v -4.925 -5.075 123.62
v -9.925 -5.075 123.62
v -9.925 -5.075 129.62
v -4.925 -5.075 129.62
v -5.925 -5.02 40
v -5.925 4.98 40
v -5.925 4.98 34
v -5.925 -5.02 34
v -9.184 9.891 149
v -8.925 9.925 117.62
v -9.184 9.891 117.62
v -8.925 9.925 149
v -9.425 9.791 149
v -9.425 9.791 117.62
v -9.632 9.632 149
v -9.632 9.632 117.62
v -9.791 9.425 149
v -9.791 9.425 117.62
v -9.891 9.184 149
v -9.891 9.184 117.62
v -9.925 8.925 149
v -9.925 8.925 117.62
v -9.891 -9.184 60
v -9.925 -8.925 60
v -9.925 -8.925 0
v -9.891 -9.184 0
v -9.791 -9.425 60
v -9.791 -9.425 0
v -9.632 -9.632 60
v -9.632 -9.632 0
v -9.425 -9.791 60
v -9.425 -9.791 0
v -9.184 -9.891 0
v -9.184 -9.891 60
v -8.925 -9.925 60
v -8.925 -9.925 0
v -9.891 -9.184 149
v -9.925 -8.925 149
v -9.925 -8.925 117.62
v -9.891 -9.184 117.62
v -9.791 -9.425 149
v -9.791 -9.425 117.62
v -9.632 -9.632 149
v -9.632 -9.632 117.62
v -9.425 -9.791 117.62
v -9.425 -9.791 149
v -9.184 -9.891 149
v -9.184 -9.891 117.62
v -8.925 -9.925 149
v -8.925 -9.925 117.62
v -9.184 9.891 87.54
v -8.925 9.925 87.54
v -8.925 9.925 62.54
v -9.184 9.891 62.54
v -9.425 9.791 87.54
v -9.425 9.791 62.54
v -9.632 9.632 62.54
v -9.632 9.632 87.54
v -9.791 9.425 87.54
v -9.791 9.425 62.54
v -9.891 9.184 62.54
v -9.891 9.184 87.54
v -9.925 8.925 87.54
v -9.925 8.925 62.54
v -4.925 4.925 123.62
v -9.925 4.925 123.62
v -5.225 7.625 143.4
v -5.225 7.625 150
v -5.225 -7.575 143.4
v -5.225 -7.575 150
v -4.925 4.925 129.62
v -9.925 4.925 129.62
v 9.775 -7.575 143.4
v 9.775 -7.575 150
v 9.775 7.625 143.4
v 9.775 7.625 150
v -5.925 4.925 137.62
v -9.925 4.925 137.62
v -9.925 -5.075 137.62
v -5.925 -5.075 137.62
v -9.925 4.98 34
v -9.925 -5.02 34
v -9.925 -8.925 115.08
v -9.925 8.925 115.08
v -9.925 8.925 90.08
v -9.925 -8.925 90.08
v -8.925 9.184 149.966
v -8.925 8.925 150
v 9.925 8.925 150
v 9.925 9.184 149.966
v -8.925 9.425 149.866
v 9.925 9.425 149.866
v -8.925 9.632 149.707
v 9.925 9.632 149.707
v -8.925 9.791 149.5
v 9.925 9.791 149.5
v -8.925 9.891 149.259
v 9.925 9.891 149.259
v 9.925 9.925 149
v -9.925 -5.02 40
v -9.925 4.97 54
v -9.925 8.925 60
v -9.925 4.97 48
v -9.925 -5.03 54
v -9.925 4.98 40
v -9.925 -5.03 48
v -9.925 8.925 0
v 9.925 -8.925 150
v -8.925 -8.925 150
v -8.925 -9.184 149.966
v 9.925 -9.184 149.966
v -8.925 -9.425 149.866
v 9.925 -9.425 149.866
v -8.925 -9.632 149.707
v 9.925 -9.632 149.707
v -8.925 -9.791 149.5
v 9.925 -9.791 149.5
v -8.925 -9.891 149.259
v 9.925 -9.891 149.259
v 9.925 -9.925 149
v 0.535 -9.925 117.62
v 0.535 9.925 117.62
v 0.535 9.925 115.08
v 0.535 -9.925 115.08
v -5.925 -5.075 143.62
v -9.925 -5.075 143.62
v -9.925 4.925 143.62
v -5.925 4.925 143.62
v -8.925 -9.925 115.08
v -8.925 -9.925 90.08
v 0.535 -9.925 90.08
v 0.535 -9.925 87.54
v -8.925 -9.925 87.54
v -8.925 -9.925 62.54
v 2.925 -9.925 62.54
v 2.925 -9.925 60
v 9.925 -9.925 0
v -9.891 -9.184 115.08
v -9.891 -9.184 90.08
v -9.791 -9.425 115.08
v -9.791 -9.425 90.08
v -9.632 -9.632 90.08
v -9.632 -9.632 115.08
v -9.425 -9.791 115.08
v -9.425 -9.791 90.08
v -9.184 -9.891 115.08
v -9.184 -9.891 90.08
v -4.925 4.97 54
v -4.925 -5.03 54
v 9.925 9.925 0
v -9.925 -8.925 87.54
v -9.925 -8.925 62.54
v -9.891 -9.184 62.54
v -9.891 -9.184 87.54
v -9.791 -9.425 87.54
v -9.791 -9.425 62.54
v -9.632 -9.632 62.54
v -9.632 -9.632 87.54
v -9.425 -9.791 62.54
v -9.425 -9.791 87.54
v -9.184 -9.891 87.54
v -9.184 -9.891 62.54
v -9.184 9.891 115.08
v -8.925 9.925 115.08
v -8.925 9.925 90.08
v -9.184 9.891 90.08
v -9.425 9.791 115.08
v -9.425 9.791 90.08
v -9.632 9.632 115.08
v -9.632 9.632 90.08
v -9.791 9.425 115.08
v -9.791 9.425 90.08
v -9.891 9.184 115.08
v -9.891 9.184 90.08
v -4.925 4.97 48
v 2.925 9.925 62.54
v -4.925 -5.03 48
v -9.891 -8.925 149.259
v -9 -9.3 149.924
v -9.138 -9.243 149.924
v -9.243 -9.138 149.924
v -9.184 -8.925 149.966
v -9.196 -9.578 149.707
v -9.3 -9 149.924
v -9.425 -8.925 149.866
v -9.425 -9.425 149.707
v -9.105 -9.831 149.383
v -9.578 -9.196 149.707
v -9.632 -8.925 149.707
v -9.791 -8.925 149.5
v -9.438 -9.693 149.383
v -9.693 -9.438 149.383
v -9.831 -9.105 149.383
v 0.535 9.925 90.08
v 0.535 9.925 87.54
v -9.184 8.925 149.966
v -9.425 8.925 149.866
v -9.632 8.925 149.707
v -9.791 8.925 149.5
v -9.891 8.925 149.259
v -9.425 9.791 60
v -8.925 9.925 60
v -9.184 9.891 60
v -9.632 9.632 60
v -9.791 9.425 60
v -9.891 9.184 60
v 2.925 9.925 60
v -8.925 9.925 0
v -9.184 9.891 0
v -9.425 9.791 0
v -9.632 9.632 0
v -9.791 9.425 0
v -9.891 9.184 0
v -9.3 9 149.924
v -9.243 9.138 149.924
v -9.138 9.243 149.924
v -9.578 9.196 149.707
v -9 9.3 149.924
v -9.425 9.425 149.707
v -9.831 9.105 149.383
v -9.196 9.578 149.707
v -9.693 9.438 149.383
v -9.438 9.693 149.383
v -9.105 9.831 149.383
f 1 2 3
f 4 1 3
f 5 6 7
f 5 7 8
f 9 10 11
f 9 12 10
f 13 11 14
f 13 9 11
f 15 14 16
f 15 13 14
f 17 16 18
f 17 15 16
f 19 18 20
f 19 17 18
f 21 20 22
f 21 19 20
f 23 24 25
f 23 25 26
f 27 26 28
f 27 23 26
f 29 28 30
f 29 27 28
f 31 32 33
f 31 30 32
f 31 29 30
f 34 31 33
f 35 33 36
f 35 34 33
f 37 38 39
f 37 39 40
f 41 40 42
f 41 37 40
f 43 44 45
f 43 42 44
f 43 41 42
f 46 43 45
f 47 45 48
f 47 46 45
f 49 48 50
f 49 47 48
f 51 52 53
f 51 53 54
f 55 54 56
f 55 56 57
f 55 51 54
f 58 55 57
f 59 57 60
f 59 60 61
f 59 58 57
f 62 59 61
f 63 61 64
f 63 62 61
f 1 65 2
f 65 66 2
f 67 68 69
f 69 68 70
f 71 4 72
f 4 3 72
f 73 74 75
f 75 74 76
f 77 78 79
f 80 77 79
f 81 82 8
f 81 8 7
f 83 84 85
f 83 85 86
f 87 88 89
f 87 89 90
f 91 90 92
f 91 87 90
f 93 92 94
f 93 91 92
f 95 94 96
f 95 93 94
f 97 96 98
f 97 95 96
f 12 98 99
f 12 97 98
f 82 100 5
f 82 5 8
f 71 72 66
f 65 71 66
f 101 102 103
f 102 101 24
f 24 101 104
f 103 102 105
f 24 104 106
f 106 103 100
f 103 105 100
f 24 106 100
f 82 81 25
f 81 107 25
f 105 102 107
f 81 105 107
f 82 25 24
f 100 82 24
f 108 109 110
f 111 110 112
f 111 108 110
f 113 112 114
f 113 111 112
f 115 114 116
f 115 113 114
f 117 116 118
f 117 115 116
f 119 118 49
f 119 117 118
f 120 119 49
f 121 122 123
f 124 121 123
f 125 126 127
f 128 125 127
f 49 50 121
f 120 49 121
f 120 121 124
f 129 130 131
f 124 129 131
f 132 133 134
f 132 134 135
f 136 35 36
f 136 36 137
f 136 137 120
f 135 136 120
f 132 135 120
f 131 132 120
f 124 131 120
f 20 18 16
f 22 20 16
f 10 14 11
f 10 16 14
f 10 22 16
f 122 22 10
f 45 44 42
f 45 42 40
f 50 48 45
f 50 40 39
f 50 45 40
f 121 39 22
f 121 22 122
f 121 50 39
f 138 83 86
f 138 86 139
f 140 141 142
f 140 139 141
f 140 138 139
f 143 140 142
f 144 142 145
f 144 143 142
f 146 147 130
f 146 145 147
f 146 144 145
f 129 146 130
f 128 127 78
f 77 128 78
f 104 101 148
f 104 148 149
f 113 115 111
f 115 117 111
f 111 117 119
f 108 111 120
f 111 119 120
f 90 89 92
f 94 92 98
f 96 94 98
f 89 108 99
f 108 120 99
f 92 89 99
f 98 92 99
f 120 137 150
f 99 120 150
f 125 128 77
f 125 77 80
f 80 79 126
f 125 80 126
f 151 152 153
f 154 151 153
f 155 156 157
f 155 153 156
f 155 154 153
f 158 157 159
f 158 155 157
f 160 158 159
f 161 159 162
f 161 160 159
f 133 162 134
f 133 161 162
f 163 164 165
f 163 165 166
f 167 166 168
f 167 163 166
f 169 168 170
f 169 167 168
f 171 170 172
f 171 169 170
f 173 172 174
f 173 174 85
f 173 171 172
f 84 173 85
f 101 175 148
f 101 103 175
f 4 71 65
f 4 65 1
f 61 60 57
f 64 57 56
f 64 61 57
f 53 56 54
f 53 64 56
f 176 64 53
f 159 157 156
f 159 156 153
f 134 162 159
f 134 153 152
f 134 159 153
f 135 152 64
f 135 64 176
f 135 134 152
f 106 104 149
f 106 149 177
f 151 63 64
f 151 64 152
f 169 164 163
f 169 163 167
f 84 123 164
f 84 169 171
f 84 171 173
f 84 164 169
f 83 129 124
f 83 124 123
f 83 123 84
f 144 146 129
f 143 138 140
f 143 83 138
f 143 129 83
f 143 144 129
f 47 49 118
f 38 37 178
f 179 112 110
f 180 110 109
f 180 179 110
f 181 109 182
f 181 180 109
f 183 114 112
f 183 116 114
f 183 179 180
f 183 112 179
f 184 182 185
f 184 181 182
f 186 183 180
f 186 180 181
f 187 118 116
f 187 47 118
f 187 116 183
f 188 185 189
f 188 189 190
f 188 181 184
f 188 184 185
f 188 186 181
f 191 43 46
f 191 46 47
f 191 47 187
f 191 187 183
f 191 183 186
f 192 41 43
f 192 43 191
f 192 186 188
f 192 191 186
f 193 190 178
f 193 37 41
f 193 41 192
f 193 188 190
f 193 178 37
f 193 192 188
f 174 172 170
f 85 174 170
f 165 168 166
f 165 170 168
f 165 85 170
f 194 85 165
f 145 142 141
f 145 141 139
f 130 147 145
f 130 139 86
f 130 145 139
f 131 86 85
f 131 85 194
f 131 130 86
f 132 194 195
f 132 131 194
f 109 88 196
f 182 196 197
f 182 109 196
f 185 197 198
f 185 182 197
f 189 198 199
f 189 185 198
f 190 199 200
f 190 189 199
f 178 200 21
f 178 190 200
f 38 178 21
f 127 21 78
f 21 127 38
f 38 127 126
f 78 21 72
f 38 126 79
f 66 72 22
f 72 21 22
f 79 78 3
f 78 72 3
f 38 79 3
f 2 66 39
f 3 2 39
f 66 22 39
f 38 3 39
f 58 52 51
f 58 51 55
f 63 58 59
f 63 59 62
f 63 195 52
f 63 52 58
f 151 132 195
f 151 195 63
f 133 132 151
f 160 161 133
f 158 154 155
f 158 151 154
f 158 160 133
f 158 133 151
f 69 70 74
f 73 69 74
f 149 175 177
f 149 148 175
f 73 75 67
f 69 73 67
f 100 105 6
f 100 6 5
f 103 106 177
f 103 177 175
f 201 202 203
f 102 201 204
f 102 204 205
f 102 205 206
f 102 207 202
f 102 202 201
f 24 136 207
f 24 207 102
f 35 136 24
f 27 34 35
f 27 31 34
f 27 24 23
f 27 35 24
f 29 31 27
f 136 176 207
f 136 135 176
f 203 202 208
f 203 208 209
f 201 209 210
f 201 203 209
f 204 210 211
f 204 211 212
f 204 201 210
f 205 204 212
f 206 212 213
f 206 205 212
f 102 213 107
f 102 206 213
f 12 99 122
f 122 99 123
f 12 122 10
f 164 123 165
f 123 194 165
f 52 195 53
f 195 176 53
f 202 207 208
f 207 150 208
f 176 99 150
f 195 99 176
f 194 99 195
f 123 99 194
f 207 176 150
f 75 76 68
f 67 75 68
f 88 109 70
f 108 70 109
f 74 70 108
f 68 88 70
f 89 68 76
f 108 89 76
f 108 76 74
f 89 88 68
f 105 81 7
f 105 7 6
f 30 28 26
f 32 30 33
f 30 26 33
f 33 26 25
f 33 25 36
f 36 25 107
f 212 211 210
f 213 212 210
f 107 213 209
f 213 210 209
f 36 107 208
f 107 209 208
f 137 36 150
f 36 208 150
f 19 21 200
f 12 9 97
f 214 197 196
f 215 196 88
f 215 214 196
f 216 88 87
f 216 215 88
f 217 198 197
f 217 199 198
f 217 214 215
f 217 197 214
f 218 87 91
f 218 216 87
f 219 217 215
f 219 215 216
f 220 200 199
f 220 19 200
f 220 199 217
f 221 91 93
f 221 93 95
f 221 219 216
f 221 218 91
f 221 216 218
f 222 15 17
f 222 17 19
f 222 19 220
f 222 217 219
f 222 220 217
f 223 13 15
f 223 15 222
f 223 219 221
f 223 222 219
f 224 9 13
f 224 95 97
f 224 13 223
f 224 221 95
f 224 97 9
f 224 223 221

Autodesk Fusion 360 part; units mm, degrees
sketch "Sketch1" plane through (0, 0, 0) normal (0, 0, 1) x (1, 0, 0)
  line L0 (9.925, 9.925) -> (-9.925, 9.925)
  line L1 (-9.925, 9.925) -> (-9.925, -9.925)
  line L2 (-9.925, -9.925) -> (9.925, -9.925)
  line L3 (9.925, -9.925) -> (9.925, 9.925)
  line L4 (9.925, 9.925) -> (-9.925, -9.925) construction
  line L5 (-9.925, 9.925) -> (9.925, -9.925) construction
  dimension "d1" = 19.85
  dimension "d2" = 19.85
extrude "Extrude1" add sketch "Sketch1" along normal blind 150
sketch "Sketch2" plane through (0, -9.925, 0) normal (0, -1, 0) x (1, 0, 0)
  line L0 (-9.925, 0) -> (9.925, 0)
  line L1 (9.925, 0) -> (9.925, 150)
  line L2 (9.925, 150) -> (-9.925, 150)
  line L3 (-9.925, 150) -> (-9.925, 0)
  line L4 (-9.925, 62.54) -> (2.925, 62.54)
  line L5 (2.925, 62.54) -> (2.925, 60)
  line L6 (2.925, 60) -> (-9.925, 60)
  line L7 (-9.925, 60) -> (-9.925, 62.54)
  line L8 (-9.925, 90.08) -> (0.535, 90.08)
  line L9 (0.535, 90.08) -> (0.535, 87.54)
  line L10 (0.535, 87.54) -> (-9.925, 87.54)
  line L11 (-9.925, 87.54) -> (-9.925, 90.08)
  line L12 (-9.925, 117.62) -> (0.535, 117.62)
  line L13 (0.535, 117.62) -> (0.535, 115.08)
  line L14 (0.535, 115.08) -> (-9.925, 115.08)
  line L15 (-9.925, 115.08) -> (-9.925, 117.62)
  dimension "d5" = 12.85
  dimension "d6" = 2.54
  dimension "d7" = 60
  dimension "d8" = 10.46
  dimension "d9" = 2.54
  dimension "d10" = 25
  dimension "d11" = 10.46
  dimension "d12" = 2.54
  dimension "d13" = 25
extrude "Extrude2" cut sketch "Sketch2" against normal blind 30 contours L3 L4 L5 L6 L7 | L3 L8 L9 L10 L11 | L3 L12 L13 L14 L15
fillet "Fillet1" radius 1 8 edges at (-9.925, -9.925, 133.81) (-9.925, -9.925, 102.58) (-9.925, -9.925, 75.04) (-9.925, -9.925, 30) (-9.925, 9.925, 133.81) (-9.925, 9.925, 102.58) (-9.925, 9.925, 75.04) (-9.925, 9.925, 30)
fillet "Fillet2" radius 1 5 edges at (0.5, 9.925, 150) (-9.6321, 9.6321, 150) (-9.925, 0, 150) (-9.6321, -9.6321, 150) (0.5, -9.925, 150)
sketch "Sketch3" plane through (-9.925, 0, 0) normal (-1, 0, 0) x (0, -1, 0)
  line L0 (8.925, 149) -> (-8.925, 149)
  line L1 (-8.925, 149) -> (-8.925, 117.62)
  line L2 (-8.925, 117.62) -> (8.925, 117.62)
  line L3 (8.925, 117.62) -> (8.925, 149)
  line L4 (5.075, 129.62) -> (-4.925, 129.62)
  line L5 (-4.925, 129.62) -> (-4.925, 123.62)
  line L6 (-4.925, 123.62) -> (5.075, 123.62)
  line L7 (5.075, 123.62) -> (5.075, 129.62)
  line L8 (5.075, 129.62) -> (-4.925, 123.62) construction
  line L9 (-4.925, 129.62) -> (5.075, 123.62) construction
  line L10 (-4.9698, 54) -> (5.0302, 54)
  line L11 (5.0302, 54) -> (5.0302, 48)
  line L12 (5.0302, 48) -> (-4.9698, 48)
  line L13 (-4.9698, 48) -> (-4.9698, 54)
  line L14 (-4.9698, 54) -> (5.0302, 48) construction
  line L15 (5.0302, 54) -> (-4.9698, 48) construction
  line L16 (8.925, 60) -> (-8.925, 60)
  point P0 (0.075, 126.62)
  point P1 (0.0302, 51)
  dimension "d20" = 10
  dimension "d21" = 6
  dimension "d22" = 3.85
  dimension "d23" = 6
  dimension "d24" = 6
  dimension "d25" = 10
  dimension "d26" = 6
extrude "Extrude3" cut sketch "Sketch3" against normal blind 5 contours L4 L5 L6 L7 | L10 L11 L12 L13
sketch "Sketch4" plane through (0, 0, 150) normal (0, 0, 1) x (-1, 0, 0)
  line L0 (8.925, 8.925) -> (-9.925, 8.925)
  line L1 (-9.925, 8.925) -> (-9.925, -8.925)
  line L2 (-9.925, -8.925) -> (8.925, -8.925)
  line L3 (8.925, -8.925) -> (8.925, 8.925)
  line L4 (-9.775, -7.625) -> (5.225, -7.625)
  line L5 (5.225, -7.625) -> (5.225, 7.575)
  line L6 (5.225, 7.575) -> (-9.775, 7.575)
  line L7 (-9.775, 7.575) -> (-9.775, -7.625)
  line L8 (-9.775, -7.625) -> (5.225, 7.575) construction
  line L9 (5.225, -7.625) -> (-9.775, 7.575) construction
  point P0 (-2.275, -0.025)
  dimension "d29" = 15
  dimension "d30" = 15.2
  dimension "d31" = 1.3
  dimension "d32" = 3.7
extrude "Extrude4" cut sketch "Sketch4" against normal blind 6.6 contours L4 L5 L6 L7
sketch "Sketch7" plane through (-9.925, 0, 0) normal (-1, 0, 0) x (0, -1, 0)
  line L0 (-4.925, 129.62) -> (5.075, 129.62)
  line L1 (5.075, 129.62) -> (5.075, 123.62)
  line L2 (5.075, 123.62) -> (-4.925, 123.62)
  line L3 (-4.925, 123.62) -> (-4.925, 129.62)
  line L4 (8.925, 149) -> (-8.925, 149)
  line L5 (-8.925, 149) -> (-8.925, 117.62)
  line L6 (-8.925, 117.62) -> (8.925, 117.62)
  line L7 (8.925, 117.62) -> (8.925, 149)
  line L8 (5.075, 143.62) -> (-4.925, 143.62)
  line L9 (-4.925, 143.62) -> (-4.925, 137.62)
  line L10 (-4.925, 137.62) -> (5.075, 137.62)
  line L11 (5.075, 137.62) -> (5.075, 143.62)
  line L12 (5.075, 143.62) -> (-4.925, 137.62) construction
  line L13 (-4.925, 143.62) -> (5.075, 137.62) construction
  line L14 (5.0197, 34) -> (-4.9803, 34)
  line L15 (-4.9803, 34) -> (-4.9803, 40)
  line L16 (-4.9803, 40) -> (5.0197, 40)
  line L17 (5.0197, 40) -> (5.0197, 34)
  line L18 (5.0197, 34) -> (-4.9803, 40) construction
  line L19 (-4.9803, 34) -> (5.0197, 40) construction
  line L20 (5.0302, 48) -> (-4.9698, 48)
  point P0 (0.075, 140.62)
  point P1 (0.0197, 37)
  dimension "d45" = 8
  dimension "d46" = 3.85
  dimension "d47" = 6
  dimension "d48" = 10
  dimension "d49" = 6
  dimension "d50" = 8
extrude "Extrude6" cut sketch "Sketch7" against normal blind 4 contours L8 L9 L10 L11 | L14 L15 L16 L17
